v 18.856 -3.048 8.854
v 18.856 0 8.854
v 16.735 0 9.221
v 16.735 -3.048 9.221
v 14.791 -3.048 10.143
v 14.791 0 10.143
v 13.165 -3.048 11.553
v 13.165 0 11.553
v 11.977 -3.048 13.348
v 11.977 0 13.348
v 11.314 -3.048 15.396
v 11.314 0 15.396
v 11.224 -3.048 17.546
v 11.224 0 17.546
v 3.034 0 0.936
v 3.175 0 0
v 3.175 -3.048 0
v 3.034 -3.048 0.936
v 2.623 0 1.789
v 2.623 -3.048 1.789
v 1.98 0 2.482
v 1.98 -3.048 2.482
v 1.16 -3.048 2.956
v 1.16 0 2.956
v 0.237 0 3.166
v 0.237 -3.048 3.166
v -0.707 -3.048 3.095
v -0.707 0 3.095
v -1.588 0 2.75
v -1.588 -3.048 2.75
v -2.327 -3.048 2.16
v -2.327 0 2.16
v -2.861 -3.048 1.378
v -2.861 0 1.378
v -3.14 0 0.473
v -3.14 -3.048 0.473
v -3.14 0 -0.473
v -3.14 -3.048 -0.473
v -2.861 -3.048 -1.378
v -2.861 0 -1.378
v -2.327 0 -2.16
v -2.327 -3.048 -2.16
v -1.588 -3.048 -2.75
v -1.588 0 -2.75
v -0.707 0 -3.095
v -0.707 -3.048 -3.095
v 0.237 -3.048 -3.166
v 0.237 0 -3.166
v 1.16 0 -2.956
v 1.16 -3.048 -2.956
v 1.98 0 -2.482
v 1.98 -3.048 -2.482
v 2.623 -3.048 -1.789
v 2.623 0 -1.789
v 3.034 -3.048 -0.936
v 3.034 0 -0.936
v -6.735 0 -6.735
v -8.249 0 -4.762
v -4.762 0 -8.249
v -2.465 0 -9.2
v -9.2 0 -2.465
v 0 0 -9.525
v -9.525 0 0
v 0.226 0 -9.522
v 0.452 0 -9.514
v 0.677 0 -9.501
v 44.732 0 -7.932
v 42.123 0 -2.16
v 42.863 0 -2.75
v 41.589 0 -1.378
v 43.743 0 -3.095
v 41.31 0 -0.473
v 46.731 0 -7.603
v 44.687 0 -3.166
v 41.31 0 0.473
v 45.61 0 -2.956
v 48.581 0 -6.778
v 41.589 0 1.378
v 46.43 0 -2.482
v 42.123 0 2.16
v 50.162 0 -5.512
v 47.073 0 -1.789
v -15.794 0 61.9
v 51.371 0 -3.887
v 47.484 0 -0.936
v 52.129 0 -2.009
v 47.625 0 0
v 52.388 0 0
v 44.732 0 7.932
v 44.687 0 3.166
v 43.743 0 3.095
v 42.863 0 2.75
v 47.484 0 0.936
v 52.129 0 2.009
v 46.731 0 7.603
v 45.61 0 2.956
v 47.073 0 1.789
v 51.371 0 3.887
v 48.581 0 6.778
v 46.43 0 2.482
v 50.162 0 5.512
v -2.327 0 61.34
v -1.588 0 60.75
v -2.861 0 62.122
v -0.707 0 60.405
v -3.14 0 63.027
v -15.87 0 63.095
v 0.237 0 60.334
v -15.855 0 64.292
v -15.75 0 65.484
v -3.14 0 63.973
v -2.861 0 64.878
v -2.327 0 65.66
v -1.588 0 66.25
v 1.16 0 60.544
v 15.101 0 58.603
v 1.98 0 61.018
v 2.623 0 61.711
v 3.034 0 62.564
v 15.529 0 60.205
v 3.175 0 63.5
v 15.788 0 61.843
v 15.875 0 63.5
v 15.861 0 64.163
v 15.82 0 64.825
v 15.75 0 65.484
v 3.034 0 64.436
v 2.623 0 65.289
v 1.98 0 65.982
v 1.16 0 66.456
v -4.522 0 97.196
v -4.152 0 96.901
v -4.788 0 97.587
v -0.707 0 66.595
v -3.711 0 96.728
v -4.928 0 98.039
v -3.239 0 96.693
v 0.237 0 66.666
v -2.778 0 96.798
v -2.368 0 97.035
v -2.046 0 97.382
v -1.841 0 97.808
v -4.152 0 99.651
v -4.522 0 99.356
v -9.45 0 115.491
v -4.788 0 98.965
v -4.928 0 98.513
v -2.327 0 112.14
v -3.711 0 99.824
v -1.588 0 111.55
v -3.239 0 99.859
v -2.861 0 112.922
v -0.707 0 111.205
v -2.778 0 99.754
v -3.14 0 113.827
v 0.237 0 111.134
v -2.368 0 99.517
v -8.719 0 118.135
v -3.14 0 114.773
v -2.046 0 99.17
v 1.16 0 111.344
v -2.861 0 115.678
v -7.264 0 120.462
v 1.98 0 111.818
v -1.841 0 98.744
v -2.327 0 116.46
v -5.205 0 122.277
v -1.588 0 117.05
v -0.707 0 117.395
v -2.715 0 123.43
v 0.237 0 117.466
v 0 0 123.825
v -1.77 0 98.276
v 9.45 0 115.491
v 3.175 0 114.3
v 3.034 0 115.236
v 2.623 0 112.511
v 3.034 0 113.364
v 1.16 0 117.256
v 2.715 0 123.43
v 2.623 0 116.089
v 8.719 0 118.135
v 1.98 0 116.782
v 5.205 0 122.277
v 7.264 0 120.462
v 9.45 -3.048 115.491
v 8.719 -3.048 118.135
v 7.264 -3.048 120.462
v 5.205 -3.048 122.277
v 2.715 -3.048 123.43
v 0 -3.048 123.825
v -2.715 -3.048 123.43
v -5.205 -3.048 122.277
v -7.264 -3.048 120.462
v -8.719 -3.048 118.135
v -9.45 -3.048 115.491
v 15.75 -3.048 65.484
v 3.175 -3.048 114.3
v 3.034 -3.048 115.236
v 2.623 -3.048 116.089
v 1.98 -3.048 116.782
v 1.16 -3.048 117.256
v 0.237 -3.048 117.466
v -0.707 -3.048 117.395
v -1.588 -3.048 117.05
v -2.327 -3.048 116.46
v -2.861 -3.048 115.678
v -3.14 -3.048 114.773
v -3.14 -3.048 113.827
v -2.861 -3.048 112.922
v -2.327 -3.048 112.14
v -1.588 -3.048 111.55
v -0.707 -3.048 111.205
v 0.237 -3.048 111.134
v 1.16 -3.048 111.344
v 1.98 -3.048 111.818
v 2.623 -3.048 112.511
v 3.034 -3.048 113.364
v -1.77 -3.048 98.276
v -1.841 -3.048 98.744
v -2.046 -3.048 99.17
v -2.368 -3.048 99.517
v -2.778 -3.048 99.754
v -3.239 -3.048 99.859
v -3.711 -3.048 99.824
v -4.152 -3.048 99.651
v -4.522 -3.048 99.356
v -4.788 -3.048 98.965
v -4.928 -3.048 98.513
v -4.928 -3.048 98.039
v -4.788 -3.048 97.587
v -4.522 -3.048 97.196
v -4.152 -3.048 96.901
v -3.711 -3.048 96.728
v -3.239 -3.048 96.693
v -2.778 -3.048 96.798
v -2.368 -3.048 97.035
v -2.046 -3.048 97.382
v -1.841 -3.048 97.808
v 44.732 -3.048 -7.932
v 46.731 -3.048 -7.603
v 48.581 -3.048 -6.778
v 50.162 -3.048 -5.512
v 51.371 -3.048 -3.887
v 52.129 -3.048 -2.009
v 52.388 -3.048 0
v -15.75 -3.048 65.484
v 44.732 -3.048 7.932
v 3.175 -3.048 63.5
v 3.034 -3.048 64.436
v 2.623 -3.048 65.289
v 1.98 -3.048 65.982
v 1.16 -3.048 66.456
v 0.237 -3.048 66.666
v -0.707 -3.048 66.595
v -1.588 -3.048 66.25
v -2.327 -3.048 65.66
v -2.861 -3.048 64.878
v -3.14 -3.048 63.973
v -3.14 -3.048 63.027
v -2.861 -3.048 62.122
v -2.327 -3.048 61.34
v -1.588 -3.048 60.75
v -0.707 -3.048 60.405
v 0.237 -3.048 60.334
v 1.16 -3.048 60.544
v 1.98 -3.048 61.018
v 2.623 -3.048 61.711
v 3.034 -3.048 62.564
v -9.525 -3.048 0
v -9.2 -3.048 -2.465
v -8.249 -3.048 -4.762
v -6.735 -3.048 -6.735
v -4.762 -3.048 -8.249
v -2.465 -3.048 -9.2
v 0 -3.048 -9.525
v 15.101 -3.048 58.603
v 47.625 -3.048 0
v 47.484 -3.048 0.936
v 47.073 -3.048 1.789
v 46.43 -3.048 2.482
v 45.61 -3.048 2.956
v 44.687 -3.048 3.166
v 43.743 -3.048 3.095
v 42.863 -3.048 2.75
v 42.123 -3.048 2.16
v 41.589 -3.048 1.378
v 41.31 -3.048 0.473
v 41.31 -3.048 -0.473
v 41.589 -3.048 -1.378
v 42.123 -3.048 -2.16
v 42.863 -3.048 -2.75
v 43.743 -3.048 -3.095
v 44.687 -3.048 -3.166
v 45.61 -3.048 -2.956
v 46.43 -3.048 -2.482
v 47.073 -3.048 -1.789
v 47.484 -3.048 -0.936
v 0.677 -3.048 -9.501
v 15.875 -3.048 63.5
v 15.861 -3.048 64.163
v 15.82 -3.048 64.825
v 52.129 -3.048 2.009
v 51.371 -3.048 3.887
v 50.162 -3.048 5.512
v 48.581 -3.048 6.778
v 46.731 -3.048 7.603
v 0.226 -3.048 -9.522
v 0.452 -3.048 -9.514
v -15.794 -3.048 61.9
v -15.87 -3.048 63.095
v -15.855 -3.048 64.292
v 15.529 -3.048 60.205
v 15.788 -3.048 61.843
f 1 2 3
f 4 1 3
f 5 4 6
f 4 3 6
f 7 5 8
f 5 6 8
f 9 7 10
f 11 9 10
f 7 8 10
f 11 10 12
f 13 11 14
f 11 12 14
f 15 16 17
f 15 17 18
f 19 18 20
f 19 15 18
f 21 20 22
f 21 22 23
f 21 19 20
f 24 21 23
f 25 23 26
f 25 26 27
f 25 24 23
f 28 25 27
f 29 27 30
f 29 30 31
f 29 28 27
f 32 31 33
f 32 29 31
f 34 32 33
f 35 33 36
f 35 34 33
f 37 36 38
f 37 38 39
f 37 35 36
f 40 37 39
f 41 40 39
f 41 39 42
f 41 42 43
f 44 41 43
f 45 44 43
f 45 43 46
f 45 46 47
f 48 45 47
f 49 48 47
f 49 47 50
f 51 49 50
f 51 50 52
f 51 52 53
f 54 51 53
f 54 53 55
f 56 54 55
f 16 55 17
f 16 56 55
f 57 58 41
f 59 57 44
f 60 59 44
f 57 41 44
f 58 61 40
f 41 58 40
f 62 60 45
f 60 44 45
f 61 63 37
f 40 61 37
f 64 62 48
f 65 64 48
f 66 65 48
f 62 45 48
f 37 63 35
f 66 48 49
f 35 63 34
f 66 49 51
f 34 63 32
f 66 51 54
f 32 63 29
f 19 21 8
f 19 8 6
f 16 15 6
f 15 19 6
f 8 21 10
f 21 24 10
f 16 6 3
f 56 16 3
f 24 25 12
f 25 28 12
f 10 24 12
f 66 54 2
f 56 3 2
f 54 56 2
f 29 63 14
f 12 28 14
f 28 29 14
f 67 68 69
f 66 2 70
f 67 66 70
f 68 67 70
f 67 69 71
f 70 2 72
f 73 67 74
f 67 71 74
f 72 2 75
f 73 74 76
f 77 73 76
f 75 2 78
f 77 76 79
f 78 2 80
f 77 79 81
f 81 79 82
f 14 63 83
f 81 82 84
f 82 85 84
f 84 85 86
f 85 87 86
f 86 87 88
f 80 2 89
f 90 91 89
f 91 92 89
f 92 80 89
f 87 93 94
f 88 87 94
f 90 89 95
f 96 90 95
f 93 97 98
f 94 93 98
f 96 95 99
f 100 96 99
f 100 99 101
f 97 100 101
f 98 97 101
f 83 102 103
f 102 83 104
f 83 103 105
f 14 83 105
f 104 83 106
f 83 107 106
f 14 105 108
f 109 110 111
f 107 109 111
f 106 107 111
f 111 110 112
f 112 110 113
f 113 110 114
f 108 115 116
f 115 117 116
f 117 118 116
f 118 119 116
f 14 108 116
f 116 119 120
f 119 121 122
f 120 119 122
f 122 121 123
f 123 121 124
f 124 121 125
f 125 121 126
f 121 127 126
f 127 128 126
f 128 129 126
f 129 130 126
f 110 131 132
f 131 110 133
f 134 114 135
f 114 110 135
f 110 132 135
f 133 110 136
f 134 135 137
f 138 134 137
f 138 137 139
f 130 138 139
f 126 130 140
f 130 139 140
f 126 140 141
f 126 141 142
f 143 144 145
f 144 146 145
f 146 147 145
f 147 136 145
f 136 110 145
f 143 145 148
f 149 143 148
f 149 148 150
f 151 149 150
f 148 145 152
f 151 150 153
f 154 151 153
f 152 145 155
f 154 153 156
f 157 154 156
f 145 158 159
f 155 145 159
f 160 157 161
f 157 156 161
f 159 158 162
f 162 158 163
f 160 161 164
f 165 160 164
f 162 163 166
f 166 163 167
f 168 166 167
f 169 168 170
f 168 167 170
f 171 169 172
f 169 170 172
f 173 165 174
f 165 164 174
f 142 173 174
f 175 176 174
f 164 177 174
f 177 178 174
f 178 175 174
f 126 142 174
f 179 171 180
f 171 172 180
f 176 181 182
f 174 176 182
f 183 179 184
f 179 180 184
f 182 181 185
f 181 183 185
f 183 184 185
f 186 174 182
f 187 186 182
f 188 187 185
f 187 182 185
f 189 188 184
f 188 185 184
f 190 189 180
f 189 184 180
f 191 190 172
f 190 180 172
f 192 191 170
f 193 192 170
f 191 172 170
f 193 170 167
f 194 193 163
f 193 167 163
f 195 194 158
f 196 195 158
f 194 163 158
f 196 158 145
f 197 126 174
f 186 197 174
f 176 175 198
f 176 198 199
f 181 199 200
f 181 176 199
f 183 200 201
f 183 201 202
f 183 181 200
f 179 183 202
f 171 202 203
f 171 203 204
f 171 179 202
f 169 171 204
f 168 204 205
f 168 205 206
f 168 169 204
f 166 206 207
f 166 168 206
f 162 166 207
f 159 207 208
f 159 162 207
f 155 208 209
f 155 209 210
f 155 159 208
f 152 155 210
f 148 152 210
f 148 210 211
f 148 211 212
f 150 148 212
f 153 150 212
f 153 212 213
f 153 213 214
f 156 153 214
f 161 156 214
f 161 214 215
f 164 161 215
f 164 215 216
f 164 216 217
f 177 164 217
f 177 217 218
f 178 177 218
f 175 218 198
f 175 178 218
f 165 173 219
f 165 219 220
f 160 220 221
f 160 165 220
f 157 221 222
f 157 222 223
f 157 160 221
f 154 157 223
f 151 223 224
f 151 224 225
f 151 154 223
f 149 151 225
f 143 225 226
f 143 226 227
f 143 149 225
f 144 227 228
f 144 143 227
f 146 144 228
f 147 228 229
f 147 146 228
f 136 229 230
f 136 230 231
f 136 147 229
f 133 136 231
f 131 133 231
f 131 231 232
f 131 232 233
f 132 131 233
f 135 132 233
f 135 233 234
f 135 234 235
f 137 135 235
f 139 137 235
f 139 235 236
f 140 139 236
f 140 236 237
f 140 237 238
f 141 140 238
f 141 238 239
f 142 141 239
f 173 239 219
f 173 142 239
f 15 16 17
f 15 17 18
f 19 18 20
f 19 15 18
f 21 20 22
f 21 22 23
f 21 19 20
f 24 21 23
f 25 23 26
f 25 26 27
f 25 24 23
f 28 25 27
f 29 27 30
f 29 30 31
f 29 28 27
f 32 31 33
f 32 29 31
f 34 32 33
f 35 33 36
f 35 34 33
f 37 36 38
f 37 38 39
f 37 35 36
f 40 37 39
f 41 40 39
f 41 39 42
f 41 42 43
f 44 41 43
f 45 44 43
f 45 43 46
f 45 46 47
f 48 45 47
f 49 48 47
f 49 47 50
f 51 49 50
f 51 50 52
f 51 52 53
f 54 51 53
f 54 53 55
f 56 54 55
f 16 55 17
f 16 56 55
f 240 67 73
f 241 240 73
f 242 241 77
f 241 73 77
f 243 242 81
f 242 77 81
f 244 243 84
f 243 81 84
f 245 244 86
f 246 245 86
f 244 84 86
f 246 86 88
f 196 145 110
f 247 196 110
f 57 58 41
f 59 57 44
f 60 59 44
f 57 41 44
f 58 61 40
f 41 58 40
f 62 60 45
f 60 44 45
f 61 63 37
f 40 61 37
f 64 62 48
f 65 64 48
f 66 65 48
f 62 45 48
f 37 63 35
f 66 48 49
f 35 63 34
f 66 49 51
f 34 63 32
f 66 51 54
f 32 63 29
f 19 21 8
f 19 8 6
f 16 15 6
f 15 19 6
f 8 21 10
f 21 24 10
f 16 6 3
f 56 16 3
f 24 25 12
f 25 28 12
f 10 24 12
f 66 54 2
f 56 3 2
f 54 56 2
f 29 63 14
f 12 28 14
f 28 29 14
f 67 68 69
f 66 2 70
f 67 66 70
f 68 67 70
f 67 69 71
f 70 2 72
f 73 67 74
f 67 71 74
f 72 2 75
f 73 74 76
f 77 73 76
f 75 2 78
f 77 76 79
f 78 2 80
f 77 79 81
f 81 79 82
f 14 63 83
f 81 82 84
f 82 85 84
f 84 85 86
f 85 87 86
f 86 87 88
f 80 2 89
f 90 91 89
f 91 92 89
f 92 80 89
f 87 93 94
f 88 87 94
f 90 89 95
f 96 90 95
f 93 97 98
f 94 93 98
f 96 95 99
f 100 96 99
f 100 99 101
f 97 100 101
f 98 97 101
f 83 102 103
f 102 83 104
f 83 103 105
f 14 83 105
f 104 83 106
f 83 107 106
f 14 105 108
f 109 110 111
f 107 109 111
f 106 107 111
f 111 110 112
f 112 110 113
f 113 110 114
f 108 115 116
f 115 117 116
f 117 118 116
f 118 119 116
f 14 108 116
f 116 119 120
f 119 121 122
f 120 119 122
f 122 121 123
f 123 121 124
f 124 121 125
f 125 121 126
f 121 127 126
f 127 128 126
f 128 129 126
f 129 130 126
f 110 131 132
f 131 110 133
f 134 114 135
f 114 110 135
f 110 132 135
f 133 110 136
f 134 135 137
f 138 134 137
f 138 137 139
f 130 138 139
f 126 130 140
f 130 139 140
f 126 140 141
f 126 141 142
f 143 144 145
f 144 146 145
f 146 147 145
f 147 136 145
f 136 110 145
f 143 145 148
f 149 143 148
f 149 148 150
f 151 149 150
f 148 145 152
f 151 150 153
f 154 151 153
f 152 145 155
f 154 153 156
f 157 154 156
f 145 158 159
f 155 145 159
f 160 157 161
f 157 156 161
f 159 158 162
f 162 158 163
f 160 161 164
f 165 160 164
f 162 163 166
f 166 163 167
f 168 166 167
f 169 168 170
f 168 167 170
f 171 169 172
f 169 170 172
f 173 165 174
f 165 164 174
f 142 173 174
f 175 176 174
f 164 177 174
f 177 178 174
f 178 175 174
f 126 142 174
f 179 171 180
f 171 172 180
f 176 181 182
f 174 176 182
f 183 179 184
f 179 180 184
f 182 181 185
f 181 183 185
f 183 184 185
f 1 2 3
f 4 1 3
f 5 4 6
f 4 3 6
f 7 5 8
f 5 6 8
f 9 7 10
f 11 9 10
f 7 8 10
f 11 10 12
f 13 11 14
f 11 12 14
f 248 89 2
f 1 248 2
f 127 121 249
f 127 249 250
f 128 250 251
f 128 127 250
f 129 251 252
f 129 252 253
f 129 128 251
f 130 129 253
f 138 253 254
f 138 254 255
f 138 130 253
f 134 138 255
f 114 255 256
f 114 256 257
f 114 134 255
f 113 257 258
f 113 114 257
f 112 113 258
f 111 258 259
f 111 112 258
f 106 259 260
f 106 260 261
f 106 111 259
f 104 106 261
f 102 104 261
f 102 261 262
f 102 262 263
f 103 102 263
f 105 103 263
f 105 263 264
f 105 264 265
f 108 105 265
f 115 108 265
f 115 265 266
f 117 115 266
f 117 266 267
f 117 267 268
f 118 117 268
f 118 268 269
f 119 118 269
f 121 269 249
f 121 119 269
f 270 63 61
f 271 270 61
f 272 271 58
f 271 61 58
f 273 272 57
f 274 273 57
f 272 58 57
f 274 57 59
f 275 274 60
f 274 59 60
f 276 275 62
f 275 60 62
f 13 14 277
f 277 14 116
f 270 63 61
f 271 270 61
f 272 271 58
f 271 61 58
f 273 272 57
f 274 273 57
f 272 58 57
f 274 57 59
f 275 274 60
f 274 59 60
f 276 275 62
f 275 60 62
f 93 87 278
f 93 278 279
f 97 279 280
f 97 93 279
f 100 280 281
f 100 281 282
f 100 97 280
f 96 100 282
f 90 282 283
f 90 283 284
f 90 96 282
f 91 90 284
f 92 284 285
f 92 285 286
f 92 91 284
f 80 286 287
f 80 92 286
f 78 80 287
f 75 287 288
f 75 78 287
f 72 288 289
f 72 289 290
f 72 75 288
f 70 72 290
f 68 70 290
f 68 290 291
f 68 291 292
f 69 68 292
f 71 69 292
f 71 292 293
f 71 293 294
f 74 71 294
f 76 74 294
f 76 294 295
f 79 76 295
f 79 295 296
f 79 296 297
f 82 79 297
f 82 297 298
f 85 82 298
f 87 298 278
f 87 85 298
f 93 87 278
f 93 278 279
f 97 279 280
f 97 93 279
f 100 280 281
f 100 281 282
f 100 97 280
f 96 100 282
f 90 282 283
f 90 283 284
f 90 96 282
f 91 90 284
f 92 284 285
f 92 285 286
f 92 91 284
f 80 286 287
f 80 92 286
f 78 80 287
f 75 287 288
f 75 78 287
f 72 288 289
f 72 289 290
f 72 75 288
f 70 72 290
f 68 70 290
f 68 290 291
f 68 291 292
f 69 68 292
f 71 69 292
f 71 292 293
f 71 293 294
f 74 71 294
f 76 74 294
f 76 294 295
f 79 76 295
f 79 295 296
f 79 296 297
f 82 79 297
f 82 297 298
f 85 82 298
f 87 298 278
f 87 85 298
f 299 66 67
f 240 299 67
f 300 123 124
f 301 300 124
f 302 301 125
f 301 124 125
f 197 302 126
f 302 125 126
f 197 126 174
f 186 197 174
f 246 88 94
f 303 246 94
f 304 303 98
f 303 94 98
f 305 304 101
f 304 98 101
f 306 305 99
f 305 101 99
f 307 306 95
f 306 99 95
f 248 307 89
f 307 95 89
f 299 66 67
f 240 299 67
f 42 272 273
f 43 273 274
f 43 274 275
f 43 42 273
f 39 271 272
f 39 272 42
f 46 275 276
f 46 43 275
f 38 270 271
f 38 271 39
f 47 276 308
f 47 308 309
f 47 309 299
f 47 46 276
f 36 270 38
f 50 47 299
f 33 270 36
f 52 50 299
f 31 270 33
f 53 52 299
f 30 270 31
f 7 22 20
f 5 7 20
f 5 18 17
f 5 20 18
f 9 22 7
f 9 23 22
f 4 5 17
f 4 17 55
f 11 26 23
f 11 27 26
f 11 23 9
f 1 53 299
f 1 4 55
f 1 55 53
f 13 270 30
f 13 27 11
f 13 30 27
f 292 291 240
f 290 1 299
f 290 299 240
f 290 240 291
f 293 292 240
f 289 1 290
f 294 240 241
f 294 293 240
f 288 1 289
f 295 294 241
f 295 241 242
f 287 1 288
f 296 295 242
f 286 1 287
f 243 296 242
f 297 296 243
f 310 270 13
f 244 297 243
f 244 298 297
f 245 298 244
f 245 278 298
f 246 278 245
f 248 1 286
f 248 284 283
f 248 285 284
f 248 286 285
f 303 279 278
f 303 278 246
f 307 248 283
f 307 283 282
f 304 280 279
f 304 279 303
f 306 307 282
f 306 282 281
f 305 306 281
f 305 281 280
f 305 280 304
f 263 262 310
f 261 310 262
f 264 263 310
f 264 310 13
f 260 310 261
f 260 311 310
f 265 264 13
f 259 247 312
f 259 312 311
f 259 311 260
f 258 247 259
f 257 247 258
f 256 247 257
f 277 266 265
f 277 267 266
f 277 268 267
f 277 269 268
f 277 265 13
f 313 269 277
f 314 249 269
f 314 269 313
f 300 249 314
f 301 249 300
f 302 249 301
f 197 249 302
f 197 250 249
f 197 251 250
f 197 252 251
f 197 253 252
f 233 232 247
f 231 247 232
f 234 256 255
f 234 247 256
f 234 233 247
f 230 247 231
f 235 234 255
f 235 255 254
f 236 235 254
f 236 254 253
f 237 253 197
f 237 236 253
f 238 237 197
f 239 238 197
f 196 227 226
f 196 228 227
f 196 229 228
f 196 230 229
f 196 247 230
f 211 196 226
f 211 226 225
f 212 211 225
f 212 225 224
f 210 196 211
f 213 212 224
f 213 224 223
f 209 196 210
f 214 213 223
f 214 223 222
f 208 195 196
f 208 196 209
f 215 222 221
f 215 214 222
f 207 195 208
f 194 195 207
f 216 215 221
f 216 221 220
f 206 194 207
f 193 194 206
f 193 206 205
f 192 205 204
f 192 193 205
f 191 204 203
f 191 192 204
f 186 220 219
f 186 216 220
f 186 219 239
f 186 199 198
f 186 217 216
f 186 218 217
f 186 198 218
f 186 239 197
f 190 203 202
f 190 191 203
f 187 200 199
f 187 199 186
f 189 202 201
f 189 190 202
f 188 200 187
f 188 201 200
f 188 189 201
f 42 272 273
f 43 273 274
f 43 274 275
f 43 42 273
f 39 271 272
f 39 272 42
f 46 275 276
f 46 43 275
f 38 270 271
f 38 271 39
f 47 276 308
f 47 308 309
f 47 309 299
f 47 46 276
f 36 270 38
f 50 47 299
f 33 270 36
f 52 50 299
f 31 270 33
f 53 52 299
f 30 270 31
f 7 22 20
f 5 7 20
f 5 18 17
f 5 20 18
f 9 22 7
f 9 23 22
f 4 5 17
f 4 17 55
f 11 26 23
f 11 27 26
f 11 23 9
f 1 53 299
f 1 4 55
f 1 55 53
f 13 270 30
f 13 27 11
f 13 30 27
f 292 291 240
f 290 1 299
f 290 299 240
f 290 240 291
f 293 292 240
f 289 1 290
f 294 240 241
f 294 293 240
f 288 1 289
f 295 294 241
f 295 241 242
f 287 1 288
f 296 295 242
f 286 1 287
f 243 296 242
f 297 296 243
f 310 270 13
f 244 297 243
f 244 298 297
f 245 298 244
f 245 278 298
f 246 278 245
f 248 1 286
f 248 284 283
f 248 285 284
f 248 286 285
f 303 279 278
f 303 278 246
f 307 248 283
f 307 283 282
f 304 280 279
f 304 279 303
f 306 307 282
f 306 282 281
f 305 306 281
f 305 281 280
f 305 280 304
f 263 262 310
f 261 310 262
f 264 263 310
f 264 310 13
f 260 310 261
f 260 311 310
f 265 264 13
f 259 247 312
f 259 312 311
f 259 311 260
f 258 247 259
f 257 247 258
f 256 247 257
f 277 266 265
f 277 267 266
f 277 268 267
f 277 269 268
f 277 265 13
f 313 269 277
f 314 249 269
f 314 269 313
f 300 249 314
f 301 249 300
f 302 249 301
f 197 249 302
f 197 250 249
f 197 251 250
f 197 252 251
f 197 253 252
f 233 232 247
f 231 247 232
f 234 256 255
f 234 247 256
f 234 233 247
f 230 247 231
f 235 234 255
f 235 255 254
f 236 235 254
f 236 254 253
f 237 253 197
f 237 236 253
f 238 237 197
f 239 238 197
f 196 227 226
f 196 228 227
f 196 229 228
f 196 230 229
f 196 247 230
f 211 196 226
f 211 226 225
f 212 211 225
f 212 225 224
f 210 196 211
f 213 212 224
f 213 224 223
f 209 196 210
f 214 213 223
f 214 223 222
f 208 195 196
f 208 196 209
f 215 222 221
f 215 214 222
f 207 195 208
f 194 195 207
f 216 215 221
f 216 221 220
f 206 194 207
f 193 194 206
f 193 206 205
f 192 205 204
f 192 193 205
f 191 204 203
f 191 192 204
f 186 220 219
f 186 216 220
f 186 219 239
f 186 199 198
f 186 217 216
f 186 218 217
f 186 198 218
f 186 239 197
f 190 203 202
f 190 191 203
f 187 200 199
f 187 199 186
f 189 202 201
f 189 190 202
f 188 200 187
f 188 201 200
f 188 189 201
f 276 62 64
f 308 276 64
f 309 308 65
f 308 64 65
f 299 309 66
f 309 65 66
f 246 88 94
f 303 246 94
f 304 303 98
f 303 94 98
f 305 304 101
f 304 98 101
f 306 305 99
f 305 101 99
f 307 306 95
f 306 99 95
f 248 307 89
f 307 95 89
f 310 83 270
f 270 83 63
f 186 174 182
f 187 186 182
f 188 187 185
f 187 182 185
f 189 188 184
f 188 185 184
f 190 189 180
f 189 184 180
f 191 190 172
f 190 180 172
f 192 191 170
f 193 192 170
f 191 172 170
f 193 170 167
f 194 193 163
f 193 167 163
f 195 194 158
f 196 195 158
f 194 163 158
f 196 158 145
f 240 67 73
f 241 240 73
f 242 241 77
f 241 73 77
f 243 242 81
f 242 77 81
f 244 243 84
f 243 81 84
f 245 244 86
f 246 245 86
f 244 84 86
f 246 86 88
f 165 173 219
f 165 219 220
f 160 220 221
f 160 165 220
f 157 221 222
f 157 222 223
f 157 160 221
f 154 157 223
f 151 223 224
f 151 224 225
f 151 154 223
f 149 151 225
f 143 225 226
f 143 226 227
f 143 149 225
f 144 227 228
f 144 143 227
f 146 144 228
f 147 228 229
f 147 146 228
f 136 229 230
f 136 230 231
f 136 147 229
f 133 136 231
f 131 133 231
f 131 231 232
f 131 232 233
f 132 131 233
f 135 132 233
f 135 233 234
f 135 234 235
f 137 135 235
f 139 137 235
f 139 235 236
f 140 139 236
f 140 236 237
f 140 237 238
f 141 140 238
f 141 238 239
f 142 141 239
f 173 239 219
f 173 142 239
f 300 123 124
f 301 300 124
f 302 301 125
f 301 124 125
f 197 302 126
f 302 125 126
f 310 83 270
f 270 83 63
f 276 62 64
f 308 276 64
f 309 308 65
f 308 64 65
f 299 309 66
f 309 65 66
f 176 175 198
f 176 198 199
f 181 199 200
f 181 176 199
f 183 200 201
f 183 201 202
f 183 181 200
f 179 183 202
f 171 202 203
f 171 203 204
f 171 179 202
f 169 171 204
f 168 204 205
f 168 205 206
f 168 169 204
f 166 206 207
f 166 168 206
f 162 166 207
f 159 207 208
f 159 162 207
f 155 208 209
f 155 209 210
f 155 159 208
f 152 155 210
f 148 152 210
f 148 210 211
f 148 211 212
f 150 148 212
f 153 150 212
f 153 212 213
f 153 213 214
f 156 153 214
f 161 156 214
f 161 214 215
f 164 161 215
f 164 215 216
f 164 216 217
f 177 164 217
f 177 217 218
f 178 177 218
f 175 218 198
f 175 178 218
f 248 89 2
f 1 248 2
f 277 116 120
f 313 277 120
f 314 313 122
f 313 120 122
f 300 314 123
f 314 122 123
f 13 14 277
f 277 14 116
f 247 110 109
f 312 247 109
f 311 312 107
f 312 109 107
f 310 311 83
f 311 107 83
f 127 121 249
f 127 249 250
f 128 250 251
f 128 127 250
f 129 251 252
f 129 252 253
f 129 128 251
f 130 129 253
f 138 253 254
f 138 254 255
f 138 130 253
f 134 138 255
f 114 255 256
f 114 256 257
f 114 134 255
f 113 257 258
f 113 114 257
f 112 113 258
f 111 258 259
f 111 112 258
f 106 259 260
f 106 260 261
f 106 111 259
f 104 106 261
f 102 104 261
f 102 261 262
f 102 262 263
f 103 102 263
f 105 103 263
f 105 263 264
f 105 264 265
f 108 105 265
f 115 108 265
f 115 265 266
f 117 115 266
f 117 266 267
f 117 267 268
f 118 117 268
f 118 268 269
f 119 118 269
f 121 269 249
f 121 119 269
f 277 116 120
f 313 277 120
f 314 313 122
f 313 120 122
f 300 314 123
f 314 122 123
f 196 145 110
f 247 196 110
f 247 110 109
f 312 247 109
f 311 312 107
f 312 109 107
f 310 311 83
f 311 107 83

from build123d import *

# Parameters (mm, degrees)
F0_R     = 3.175
F0_R_2   = 1.5875
F1_DEPTH = 3.048
F2_DEPTH = 3.048


with BuildPart() as f1:
    # F0 (on Front) → F1 (new body)
    with BuildSketch(Plane.XZ):
        with BuildLine():
            ThreePointArc((15.100703, 58.602614), (15.680231, 61.020891), (15.875, 63.5))
            ThreePointArc((15.875, 63.5), (15.843841, 64.494139), (15.750488, 65.484375))
            Line((15.750488, 65.484375), (15.100703, 58.602614))
        make_face()
        with BuildLine():
            Line((15.100703, 58.602614), (15.750488, 65.484375))
            ThreePointArc((15.750488, 65.484375), (0, 79.375), (-15.750488, 65.484375))
            ThreePointArc((-15.750488, 65.484375), (-15.873819, 63.693615), (-15.794203, 61.90038))
            ThreePointArc((-15.794203, 61.90038), (-1.684948, 47.714672), (15.100703, 58.602614))
        make_face()
        with Locations((0, 63.5)):
            Circle(F0_R, mode=Mode.SUBTRACT)
        with BuildLine():
            ThreePointArc((-15.750488, 65.484375), (0, 79.375), (15.750488, 65.484375))
            Line((15.750488, 65.484375), (9.450293, 115.490625))
            ThreePointArc((9.450293, 115.490625), (9.506305, 114.896483), (9.525, 114.3))
            ThreePointArc((9.525, 114.3), (-0.596483, 104.793695), (-9.450293, 115.490625))
            Line((-9.450293, 115.490625), (-15.750488, 65.484375))
        make_face()
        with Locations((-3.3578, 98.27597)):
            Circle(F0_R_2, mode=Mode.SUBTRACT)
        with BuildLine():
            Line((11.224102, 17.546207), (15.100703, 58.602614))
            ThreePointArc((15.100703, 58.602614), (-1.684948, 47.714672), (-15.794203, 61.90038))
            Line((-15.794203, 61.90038), (-9.525, 0))
            ThreePointArc((-9.525, 0), (0, 9.525), (9.525, 0))
            ThreePointArc((9.525, 0), (6.970557, -6.491299), (0.677344, -9.500886))
            Line((0.677344, -9.500886), (44.732405, -7.932475))
            ThreePointArc((44.732405, -7.932475), (36.5125, 0), (44.732405, 7.932475))
            Line((44.732405, 7.932475), (18.85624, 8.853696))
            ThreePointArc((18.85624, 8.853696), (13.164892, 11.553432), (11.224102, 17.546207))
        make_face()
        with BuildLine():
            ThreePointArc((9.525, 114.3), (9.506305, 114.896483), (9.450293, 115.490625))
            ThreePointArc((9.450293, 115.490625), (0, 123.825), (-9.450293, 115.490625))
            ThreePointArc((-9.450293, 115.490625), (-0.596483, 104.793695), (9.525, 114.3))
        make_face()
        with Locations((0, 114.3)):
            Circle(F0_R, mode=Mode.SUBTRACT)
        with BuildLine():
            ThreePointArc((9.525, 0), (0, 9.525), (-9.525, 0))
            ThreePointArc((-9.525, 0), (-6.735192, -6.735192), (0, -9.525))
            Line((0, -9.525), (0.677344, -9.500886))
            ThreePointArc((0.677344, -9.500886), (6.970557, -6.491299), (9.525, 0))
        make_face()
        Circle(F0_R, mode=Mode.SUBTRACT)
        with BuildLine():
            Line((0.677344, -9.500886), (0, -9.525))
            ThreePointArc((0, -9.525), (0.338886, -9.51897), (0.677344, -9.500886))
        make_face()
        with BuildLine():
            ThreePointArc((52.3875, 0), (50.161633, 5.51191), (44.732405, 7.932475))
            ThreePointArc((44.732405, 7.932475), (36.5125, 0), (44.732405, -7.932475))
            ThreePointArc((44.732405, -7.932475), (50.161633, -5.51191), (52.3875, 0))
        make_face()
        with Locations((44.45, 0)):
            Circle(F0_R, mode=Mode.SUBTRACT)
    extrude(amount=F1_DEPTH)


with BuildPart() as f2:
    # F0 (on Front) → F2 (new body)
    with BuildSketch(Plane.XZ):
        with BuildLine():
            ThreePointArc((15.100703, 58.602614), (15.680231, 61.020891), (15.875, 63.5))
            ThreePointArc((15.875, 63.5), (15.843841, 64.494139), (15.750488, 65.484375))
            Line((15.750488, 65.484375), (15.100703, 58.602614))
        make_face()
        with BuildLine():
            Line((15.100703, 58.602614), (15.750488, 65.484375))
            ThreePointArc((15.750488, 65.484375), (0, 79.375), (-15.750488, 65.484375))
            ThreePointArc((-15.750488, 65.484375), (-15.873819, 63.693615), (-15.794203, 61.90038))
            ThreePointArc((-15.794203, 61.90038), (-1.684948, 47.714672), (15.100703, 58.602614))
        make_face()
        with Locations((0, 63.5)):
            Circle(F0_R, mode=Mode.SUBTRACT)
        with BuildLine():
            ThreePointArc((-15.750488, 65.484375), (0, 79.375), (15.750488, 65.484375))
            Line((15.750488, 65.484375), (9.450293, 115.490625))
            ThreePointArc((9.450293, 115.490625), (9.506305, 114.896483), (9.525, 114.3))
            ThreePointArc((9.525, 114.3), (-0.596483, 104.793695), (-9.450293, 115.490625))
            Line((-9.450293, 115.490625), (-15.750488, 65.484375))
        make_face()
        with Locations((-3.3578, 98.27597)):
            Circle(F0_R_2, mode=Mode.SUBTRACT)
        with BuildLine():
            Line((11.224102, 17.546207), (15.100703, 58.602614))
            ThreePointArc((15.100703, 58.602614), (-1.684948, 47.714672), (-15.794203, 61.90038))
            Line((-15.794203, 61.90038), (-9.525, 0))
            ThreePointArc((-9.525, 0), (0, 9.525), (9.525, 0))
            ThreePointArc((9.525, 0), (6.970557, -6.491299), (0.677344, -9.500886))
            Line((0.677344, -9.500886), (44.732405, -7.932475))
            ThreePointArc((44.732405, -7.932475), (36.5125, 0), (44.732405, 7.932475))
            Line((44.732405, 7.932475), (18.85624, 8.853696))
            ThreePointArc((18.85624, 8.853696), (13.164892, 11.553432), (11.224102, 17.546207))
        make_face()
        with BuildLine():
            ThreePointArc((9.525, 114.3), (9.506305, 114.896483), (9.450293, 115.490625))
            ThreePointArc((9.450293, 115.490625), (0, 123.825), (-9.450293, 115.490625))
            ThreePointArc((-9.450293, 115.490625), (-0.596483, 104.793695), (9.525, 114.3))
        make_face()
        with Locations((0, 114.3)):
            Circle(F0_R, mode=Mode.SUBTRACT)
        with BuildLine():
            ThreePointArc((9.525, 0), (0, 9.525), (-9.525, 0))
            ThreePointArc((-9.525, 0), (-6.735192, -6.735192), (0, -9.525))
            Line((0, -9.525), (0.677344, -9.500886))
            ThreePointArc((0.677344, -9.500886), (6.970557, -6.491299), (9.525, 0))
        make_face()
        Circle(F0_R, mode=Mode.SUBTRACT)
        with BuildLine():
            Line((0.677344, -9.500886), (0, -9.525))
            ThreePointArc((0, -9.525), (0.338886, -9.51897), (0.677344, -9.500886))
        make_face()
        with BuildLine():
            ThreePointArc((52.3875, 0), (50.161633, 5.51191), (44.732405, 7.932475))
            ThreePointArc((44.732405, 7.932475), (36.5125, 0), (44.732405, -7.932475))
            ThreePointArc((44.732405, -7.932475), (50.161633, -5.51191), (52.3875, 0))
        make_face()
        with Locations((44.45, 0)):
            Circle(F0_R, mode=Mode.SUBTRACT)
    extrude(amount=F2_DEPTH)


solid = Compound([f1.part, f2.part])
